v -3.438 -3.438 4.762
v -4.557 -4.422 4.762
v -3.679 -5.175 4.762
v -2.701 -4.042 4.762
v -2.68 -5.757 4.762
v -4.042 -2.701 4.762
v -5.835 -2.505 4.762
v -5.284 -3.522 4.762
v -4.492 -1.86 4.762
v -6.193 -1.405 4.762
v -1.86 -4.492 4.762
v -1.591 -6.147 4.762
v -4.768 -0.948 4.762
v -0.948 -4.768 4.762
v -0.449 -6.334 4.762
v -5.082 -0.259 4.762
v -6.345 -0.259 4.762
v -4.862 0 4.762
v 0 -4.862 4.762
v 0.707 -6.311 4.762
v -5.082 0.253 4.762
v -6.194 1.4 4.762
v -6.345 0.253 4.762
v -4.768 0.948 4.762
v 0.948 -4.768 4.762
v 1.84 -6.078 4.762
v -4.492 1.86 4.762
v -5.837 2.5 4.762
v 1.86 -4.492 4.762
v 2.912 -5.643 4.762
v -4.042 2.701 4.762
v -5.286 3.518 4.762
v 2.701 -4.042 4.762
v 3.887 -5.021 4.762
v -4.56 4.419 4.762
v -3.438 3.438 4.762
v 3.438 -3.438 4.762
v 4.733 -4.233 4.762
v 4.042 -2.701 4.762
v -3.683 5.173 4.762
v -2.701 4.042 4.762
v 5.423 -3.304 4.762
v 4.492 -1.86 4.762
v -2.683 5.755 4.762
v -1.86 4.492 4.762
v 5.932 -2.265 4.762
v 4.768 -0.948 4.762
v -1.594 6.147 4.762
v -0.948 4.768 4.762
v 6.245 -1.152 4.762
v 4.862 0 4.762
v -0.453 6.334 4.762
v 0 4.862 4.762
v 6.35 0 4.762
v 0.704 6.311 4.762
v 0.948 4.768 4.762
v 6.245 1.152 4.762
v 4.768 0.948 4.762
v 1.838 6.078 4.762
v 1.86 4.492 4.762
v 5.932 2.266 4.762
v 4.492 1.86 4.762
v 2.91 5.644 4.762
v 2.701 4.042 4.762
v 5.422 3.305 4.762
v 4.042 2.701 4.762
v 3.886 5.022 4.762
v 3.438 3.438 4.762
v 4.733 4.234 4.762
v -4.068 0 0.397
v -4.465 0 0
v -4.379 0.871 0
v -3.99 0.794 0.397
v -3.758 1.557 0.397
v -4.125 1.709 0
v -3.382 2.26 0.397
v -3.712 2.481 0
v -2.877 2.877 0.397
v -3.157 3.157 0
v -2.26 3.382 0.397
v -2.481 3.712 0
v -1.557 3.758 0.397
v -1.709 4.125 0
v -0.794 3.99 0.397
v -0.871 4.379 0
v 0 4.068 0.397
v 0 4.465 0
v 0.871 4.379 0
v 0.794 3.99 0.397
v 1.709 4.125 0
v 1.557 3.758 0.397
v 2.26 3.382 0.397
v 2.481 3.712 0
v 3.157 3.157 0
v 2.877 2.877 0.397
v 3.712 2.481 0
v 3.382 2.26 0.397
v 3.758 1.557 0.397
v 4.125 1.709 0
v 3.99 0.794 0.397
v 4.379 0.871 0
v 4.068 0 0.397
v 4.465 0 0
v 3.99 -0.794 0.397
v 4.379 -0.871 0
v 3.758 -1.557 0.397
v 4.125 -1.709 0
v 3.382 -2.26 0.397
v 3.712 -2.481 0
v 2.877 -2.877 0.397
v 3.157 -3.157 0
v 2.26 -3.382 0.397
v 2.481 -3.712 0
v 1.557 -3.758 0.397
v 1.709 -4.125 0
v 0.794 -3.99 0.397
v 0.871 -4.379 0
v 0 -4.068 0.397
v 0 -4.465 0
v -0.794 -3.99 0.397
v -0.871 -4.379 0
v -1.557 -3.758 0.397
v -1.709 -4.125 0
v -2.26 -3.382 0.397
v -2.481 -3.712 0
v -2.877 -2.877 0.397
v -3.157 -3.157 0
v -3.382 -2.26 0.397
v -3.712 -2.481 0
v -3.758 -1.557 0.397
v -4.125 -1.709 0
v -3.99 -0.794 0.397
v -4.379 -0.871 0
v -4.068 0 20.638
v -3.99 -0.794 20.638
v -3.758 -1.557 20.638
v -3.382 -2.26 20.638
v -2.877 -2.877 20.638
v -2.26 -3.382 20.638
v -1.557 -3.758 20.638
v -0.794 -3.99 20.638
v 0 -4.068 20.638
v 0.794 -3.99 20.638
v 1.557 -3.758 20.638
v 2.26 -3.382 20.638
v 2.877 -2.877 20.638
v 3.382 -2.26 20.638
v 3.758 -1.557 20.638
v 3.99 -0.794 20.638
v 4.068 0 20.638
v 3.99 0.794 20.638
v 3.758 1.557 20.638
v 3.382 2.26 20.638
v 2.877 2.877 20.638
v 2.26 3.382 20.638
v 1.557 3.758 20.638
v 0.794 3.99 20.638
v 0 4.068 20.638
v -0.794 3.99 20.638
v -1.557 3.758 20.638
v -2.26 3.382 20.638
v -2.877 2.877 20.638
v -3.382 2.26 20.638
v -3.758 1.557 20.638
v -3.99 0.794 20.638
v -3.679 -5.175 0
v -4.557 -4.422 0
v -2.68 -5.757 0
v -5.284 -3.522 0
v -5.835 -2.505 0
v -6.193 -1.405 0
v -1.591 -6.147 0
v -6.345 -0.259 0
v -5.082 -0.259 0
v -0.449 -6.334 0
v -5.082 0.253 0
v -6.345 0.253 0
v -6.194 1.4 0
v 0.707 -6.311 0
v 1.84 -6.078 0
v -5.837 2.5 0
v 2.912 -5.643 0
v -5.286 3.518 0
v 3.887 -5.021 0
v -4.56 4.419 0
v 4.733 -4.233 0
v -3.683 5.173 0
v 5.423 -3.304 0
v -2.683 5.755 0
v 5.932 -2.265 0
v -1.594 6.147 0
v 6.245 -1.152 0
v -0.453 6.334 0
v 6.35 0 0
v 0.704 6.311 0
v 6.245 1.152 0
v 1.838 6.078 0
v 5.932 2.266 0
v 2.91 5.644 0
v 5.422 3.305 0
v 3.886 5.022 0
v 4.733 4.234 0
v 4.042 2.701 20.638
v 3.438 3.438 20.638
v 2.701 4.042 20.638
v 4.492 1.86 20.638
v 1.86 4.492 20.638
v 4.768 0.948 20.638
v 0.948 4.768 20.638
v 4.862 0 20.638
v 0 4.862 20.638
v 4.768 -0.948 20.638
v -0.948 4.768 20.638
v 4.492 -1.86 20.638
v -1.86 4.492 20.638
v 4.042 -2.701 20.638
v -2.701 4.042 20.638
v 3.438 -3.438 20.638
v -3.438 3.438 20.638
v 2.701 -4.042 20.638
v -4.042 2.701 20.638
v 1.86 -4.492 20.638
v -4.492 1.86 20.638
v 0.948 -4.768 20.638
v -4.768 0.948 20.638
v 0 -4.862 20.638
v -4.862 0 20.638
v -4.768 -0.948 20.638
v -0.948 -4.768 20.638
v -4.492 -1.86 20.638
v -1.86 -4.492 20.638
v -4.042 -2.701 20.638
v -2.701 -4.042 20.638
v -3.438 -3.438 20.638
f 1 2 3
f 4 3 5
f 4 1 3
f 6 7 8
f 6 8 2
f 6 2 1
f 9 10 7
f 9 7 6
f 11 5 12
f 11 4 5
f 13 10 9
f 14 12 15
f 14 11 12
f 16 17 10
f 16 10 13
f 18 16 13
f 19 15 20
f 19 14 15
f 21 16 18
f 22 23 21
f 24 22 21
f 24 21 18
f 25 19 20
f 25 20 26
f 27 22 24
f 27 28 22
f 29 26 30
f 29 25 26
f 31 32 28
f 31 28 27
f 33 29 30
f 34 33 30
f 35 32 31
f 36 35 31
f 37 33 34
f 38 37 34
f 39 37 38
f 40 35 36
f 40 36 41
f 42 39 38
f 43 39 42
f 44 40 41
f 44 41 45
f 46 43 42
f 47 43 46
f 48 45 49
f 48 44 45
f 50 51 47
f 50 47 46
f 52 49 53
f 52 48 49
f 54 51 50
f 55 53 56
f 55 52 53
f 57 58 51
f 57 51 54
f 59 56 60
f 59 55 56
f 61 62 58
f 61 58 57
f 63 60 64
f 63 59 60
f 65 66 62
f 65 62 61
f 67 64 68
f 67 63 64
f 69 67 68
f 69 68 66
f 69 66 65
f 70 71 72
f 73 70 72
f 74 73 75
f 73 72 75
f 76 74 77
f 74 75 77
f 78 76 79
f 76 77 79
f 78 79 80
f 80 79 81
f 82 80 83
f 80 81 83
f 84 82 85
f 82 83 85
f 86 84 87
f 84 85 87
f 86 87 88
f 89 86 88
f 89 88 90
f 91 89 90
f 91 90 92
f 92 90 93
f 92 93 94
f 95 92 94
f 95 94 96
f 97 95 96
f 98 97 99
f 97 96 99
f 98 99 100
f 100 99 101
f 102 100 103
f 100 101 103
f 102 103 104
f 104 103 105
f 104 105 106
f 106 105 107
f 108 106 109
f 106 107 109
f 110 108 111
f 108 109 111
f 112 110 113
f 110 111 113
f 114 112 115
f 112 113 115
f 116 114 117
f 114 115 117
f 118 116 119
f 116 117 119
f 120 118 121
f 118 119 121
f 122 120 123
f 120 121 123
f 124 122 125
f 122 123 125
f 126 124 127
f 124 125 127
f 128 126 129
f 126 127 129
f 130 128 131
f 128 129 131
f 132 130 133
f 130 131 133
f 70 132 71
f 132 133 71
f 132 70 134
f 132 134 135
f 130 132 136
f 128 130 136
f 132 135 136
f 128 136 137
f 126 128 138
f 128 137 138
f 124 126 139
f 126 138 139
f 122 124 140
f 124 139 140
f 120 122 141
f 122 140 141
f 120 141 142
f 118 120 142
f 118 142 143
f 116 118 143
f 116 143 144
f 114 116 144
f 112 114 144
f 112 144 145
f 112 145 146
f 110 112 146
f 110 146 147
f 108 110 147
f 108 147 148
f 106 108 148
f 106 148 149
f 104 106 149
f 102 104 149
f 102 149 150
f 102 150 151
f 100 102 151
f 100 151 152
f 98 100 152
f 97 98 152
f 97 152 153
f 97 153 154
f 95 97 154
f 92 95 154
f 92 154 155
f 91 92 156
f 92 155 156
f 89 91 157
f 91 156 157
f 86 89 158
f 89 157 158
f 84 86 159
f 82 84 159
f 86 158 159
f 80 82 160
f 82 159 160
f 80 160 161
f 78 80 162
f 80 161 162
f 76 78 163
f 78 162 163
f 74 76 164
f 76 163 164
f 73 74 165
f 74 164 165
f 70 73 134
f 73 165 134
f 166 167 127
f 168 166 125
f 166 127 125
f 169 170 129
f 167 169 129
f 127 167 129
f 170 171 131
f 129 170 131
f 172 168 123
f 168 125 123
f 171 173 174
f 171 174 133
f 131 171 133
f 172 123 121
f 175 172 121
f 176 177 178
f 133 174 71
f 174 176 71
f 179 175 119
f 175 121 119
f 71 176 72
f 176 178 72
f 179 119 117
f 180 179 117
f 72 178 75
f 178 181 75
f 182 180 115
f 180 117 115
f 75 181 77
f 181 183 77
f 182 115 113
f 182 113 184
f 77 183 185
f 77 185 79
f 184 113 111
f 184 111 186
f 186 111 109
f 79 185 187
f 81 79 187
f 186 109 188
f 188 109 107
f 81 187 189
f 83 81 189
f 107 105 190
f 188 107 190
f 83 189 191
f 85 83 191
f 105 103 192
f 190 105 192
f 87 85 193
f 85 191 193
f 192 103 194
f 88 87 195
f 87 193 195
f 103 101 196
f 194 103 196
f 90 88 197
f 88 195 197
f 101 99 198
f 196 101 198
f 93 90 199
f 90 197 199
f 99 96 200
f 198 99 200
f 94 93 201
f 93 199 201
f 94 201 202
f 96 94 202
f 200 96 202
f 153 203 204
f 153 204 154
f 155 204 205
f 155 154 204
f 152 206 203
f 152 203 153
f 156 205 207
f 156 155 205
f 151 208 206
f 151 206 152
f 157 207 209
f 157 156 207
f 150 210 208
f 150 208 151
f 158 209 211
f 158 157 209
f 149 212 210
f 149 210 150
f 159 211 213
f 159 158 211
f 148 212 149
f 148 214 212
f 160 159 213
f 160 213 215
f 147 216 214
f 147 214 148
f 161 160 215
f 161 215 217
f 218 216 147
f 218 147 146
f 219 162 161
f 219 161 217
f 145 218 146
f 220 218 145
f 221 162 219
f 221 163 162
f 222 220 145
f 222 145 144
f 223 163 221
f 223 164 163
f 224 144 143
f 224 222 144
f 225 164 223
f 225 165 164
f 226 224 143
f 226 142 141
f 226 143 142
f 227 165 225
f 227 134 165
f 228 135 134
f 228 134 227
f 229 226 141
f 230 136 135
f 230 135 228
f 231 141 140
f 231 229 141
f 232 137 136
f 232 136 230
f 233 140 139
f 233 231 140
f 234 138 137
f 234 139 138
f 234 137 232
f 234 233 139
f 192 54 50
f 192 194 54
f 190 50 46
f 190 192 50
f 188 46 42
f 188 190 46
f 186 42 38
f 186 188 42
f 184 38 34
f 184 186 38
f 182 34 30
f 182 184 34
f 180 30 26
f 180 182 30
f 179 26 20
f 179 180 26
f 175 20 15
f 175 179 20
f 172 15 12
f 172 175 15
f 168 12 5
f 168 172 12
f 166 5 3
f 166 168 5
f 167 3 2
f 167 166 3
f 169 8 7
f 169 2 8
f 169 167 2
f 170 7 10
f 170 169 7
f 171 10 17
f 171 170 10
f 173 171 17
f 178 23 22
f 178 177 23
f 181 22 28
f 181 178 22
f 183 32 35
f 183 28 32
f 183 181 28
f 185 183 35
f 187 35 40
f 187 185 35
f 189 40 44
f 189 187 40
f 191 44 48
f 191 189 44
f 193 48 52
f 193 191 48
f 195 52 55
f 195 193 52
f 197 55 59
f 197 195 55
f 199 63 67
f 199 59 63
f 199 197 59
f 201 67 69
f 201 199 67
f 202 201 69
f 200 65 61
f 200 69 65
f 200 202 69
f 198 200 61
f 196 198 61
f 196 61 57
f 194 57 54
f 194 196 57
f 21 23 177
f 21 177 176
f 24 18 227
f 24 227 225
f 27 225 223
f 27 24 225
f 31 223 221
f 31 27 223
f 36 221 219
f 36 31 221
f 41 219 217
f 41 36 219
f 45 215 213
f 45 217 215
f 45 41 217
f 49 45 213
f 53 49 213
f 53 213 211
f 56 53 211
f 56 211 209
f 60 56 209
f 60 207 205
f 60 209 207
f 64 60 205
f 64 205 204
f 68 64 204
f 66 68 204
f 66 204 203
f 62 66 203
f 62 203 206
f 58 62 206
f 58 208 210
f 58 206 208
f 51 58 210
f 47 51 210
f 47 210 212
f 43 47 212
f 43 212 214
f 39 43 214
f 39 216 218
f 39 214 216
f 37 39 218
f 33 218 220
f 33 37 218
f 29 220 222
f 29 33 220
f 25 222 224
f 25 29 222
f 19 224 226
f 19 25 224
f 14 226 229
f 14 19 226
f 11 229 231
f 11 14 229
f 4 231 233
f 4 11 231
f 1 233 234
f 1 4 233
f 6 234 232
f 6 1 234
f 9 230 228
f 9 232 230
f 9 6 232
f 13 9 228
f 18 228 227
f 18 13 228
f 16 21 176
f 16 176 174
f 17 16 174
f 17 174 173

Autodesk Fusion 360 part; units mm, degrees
sketch "Sketch1" plane through (0, 0, 0) normal (0, 0, 1) x (1, 0, 0) in component "SpoolBottom"
  circle A0 centre (0, 0) radius 6.35
  dimension "d49" = 12.7
extrude "Extrude1" add sketch "Sketch1" along normal blind 4.7625 in component "SpoolBottom"
sketch "Sketch2" plane through (0, 0, 4.7625) normal (0, 0, 1) x (-1, 0, 0) in component "SpoolBottom"
  circle A0 centre (0, 0) radius 6.35
  circle A1 centre (0, 0) radius 4.8617
  dimension "d52" = 9.7234
extrude "Extrude2" add sketch "Sketch2" along normal blind 15.875 contours A1 in component "SpoolBottom"
sketch "Sketch3" plane through (0, 0, 20.6375) normal (0, 0, 1) x (-1, 0, 0) in component "SpoolBottom"
  circle A0 centre (0, 0) radius 4.8617
  circle A1 centre (0, 0) radius 4.068
  dimension "d55" = 8.1359
extrude "Extrude3" cut sketch "Sketch3" against normal blind 21.59 contours A1 in component "SpoolBottom"
chamfer "Chamfer1" distance 0.3969 angle 45 1 edges at (3.7927, 1.471, 0) in component "SpoolBottom"
sketch "Sketch4" plane through (0, 0, 4.7625) normal (0, 0, 1) x (-1, 0, 0) in component "SpoolBottom"
  circle A0 centre (0, 0) radius 4.8617
  circle A1 centre (0, 0) radius 6.35
  line L0 (5.0818, 0.2586) -> (6.5041, 0.2586)
  line L1 (6.5041, 0.2586) -> (6.5041, -0.2527)
  line L2 (6.5041, -0.2527) -> (5.0818, -0.2527)
  line L3 (5.0818, -0.2527) -> (5.0818, 0.2586)
extrude "Extrude4" cut sketch "Sketch4" against normal blind 4.826 contours A1 L0 L2 L3 picked at (5.5046, 0.002) in component "SpoolBottom"
component "SpoolBottom" placed x (1, 0, 0) y (0, 1, 0) z (0, 0, 1) at (0, 0, 0)
equation "d50 = ( 3 / 16 ) * 1 in"
equation "d52 = ( 5 / 16 ) * 1 in + ( 1 / 128 ) * 1 in + ( 2 / 32 ) * 1 in"
equation "d53 = ( 5 / 8 ) * 1 in"
equation "d55 = ( 5 / 16 ) * 1 in + ( 1 / 128 ) * 1 in"
equation "d58 = ( 1 / 64 ) * 1 in"
